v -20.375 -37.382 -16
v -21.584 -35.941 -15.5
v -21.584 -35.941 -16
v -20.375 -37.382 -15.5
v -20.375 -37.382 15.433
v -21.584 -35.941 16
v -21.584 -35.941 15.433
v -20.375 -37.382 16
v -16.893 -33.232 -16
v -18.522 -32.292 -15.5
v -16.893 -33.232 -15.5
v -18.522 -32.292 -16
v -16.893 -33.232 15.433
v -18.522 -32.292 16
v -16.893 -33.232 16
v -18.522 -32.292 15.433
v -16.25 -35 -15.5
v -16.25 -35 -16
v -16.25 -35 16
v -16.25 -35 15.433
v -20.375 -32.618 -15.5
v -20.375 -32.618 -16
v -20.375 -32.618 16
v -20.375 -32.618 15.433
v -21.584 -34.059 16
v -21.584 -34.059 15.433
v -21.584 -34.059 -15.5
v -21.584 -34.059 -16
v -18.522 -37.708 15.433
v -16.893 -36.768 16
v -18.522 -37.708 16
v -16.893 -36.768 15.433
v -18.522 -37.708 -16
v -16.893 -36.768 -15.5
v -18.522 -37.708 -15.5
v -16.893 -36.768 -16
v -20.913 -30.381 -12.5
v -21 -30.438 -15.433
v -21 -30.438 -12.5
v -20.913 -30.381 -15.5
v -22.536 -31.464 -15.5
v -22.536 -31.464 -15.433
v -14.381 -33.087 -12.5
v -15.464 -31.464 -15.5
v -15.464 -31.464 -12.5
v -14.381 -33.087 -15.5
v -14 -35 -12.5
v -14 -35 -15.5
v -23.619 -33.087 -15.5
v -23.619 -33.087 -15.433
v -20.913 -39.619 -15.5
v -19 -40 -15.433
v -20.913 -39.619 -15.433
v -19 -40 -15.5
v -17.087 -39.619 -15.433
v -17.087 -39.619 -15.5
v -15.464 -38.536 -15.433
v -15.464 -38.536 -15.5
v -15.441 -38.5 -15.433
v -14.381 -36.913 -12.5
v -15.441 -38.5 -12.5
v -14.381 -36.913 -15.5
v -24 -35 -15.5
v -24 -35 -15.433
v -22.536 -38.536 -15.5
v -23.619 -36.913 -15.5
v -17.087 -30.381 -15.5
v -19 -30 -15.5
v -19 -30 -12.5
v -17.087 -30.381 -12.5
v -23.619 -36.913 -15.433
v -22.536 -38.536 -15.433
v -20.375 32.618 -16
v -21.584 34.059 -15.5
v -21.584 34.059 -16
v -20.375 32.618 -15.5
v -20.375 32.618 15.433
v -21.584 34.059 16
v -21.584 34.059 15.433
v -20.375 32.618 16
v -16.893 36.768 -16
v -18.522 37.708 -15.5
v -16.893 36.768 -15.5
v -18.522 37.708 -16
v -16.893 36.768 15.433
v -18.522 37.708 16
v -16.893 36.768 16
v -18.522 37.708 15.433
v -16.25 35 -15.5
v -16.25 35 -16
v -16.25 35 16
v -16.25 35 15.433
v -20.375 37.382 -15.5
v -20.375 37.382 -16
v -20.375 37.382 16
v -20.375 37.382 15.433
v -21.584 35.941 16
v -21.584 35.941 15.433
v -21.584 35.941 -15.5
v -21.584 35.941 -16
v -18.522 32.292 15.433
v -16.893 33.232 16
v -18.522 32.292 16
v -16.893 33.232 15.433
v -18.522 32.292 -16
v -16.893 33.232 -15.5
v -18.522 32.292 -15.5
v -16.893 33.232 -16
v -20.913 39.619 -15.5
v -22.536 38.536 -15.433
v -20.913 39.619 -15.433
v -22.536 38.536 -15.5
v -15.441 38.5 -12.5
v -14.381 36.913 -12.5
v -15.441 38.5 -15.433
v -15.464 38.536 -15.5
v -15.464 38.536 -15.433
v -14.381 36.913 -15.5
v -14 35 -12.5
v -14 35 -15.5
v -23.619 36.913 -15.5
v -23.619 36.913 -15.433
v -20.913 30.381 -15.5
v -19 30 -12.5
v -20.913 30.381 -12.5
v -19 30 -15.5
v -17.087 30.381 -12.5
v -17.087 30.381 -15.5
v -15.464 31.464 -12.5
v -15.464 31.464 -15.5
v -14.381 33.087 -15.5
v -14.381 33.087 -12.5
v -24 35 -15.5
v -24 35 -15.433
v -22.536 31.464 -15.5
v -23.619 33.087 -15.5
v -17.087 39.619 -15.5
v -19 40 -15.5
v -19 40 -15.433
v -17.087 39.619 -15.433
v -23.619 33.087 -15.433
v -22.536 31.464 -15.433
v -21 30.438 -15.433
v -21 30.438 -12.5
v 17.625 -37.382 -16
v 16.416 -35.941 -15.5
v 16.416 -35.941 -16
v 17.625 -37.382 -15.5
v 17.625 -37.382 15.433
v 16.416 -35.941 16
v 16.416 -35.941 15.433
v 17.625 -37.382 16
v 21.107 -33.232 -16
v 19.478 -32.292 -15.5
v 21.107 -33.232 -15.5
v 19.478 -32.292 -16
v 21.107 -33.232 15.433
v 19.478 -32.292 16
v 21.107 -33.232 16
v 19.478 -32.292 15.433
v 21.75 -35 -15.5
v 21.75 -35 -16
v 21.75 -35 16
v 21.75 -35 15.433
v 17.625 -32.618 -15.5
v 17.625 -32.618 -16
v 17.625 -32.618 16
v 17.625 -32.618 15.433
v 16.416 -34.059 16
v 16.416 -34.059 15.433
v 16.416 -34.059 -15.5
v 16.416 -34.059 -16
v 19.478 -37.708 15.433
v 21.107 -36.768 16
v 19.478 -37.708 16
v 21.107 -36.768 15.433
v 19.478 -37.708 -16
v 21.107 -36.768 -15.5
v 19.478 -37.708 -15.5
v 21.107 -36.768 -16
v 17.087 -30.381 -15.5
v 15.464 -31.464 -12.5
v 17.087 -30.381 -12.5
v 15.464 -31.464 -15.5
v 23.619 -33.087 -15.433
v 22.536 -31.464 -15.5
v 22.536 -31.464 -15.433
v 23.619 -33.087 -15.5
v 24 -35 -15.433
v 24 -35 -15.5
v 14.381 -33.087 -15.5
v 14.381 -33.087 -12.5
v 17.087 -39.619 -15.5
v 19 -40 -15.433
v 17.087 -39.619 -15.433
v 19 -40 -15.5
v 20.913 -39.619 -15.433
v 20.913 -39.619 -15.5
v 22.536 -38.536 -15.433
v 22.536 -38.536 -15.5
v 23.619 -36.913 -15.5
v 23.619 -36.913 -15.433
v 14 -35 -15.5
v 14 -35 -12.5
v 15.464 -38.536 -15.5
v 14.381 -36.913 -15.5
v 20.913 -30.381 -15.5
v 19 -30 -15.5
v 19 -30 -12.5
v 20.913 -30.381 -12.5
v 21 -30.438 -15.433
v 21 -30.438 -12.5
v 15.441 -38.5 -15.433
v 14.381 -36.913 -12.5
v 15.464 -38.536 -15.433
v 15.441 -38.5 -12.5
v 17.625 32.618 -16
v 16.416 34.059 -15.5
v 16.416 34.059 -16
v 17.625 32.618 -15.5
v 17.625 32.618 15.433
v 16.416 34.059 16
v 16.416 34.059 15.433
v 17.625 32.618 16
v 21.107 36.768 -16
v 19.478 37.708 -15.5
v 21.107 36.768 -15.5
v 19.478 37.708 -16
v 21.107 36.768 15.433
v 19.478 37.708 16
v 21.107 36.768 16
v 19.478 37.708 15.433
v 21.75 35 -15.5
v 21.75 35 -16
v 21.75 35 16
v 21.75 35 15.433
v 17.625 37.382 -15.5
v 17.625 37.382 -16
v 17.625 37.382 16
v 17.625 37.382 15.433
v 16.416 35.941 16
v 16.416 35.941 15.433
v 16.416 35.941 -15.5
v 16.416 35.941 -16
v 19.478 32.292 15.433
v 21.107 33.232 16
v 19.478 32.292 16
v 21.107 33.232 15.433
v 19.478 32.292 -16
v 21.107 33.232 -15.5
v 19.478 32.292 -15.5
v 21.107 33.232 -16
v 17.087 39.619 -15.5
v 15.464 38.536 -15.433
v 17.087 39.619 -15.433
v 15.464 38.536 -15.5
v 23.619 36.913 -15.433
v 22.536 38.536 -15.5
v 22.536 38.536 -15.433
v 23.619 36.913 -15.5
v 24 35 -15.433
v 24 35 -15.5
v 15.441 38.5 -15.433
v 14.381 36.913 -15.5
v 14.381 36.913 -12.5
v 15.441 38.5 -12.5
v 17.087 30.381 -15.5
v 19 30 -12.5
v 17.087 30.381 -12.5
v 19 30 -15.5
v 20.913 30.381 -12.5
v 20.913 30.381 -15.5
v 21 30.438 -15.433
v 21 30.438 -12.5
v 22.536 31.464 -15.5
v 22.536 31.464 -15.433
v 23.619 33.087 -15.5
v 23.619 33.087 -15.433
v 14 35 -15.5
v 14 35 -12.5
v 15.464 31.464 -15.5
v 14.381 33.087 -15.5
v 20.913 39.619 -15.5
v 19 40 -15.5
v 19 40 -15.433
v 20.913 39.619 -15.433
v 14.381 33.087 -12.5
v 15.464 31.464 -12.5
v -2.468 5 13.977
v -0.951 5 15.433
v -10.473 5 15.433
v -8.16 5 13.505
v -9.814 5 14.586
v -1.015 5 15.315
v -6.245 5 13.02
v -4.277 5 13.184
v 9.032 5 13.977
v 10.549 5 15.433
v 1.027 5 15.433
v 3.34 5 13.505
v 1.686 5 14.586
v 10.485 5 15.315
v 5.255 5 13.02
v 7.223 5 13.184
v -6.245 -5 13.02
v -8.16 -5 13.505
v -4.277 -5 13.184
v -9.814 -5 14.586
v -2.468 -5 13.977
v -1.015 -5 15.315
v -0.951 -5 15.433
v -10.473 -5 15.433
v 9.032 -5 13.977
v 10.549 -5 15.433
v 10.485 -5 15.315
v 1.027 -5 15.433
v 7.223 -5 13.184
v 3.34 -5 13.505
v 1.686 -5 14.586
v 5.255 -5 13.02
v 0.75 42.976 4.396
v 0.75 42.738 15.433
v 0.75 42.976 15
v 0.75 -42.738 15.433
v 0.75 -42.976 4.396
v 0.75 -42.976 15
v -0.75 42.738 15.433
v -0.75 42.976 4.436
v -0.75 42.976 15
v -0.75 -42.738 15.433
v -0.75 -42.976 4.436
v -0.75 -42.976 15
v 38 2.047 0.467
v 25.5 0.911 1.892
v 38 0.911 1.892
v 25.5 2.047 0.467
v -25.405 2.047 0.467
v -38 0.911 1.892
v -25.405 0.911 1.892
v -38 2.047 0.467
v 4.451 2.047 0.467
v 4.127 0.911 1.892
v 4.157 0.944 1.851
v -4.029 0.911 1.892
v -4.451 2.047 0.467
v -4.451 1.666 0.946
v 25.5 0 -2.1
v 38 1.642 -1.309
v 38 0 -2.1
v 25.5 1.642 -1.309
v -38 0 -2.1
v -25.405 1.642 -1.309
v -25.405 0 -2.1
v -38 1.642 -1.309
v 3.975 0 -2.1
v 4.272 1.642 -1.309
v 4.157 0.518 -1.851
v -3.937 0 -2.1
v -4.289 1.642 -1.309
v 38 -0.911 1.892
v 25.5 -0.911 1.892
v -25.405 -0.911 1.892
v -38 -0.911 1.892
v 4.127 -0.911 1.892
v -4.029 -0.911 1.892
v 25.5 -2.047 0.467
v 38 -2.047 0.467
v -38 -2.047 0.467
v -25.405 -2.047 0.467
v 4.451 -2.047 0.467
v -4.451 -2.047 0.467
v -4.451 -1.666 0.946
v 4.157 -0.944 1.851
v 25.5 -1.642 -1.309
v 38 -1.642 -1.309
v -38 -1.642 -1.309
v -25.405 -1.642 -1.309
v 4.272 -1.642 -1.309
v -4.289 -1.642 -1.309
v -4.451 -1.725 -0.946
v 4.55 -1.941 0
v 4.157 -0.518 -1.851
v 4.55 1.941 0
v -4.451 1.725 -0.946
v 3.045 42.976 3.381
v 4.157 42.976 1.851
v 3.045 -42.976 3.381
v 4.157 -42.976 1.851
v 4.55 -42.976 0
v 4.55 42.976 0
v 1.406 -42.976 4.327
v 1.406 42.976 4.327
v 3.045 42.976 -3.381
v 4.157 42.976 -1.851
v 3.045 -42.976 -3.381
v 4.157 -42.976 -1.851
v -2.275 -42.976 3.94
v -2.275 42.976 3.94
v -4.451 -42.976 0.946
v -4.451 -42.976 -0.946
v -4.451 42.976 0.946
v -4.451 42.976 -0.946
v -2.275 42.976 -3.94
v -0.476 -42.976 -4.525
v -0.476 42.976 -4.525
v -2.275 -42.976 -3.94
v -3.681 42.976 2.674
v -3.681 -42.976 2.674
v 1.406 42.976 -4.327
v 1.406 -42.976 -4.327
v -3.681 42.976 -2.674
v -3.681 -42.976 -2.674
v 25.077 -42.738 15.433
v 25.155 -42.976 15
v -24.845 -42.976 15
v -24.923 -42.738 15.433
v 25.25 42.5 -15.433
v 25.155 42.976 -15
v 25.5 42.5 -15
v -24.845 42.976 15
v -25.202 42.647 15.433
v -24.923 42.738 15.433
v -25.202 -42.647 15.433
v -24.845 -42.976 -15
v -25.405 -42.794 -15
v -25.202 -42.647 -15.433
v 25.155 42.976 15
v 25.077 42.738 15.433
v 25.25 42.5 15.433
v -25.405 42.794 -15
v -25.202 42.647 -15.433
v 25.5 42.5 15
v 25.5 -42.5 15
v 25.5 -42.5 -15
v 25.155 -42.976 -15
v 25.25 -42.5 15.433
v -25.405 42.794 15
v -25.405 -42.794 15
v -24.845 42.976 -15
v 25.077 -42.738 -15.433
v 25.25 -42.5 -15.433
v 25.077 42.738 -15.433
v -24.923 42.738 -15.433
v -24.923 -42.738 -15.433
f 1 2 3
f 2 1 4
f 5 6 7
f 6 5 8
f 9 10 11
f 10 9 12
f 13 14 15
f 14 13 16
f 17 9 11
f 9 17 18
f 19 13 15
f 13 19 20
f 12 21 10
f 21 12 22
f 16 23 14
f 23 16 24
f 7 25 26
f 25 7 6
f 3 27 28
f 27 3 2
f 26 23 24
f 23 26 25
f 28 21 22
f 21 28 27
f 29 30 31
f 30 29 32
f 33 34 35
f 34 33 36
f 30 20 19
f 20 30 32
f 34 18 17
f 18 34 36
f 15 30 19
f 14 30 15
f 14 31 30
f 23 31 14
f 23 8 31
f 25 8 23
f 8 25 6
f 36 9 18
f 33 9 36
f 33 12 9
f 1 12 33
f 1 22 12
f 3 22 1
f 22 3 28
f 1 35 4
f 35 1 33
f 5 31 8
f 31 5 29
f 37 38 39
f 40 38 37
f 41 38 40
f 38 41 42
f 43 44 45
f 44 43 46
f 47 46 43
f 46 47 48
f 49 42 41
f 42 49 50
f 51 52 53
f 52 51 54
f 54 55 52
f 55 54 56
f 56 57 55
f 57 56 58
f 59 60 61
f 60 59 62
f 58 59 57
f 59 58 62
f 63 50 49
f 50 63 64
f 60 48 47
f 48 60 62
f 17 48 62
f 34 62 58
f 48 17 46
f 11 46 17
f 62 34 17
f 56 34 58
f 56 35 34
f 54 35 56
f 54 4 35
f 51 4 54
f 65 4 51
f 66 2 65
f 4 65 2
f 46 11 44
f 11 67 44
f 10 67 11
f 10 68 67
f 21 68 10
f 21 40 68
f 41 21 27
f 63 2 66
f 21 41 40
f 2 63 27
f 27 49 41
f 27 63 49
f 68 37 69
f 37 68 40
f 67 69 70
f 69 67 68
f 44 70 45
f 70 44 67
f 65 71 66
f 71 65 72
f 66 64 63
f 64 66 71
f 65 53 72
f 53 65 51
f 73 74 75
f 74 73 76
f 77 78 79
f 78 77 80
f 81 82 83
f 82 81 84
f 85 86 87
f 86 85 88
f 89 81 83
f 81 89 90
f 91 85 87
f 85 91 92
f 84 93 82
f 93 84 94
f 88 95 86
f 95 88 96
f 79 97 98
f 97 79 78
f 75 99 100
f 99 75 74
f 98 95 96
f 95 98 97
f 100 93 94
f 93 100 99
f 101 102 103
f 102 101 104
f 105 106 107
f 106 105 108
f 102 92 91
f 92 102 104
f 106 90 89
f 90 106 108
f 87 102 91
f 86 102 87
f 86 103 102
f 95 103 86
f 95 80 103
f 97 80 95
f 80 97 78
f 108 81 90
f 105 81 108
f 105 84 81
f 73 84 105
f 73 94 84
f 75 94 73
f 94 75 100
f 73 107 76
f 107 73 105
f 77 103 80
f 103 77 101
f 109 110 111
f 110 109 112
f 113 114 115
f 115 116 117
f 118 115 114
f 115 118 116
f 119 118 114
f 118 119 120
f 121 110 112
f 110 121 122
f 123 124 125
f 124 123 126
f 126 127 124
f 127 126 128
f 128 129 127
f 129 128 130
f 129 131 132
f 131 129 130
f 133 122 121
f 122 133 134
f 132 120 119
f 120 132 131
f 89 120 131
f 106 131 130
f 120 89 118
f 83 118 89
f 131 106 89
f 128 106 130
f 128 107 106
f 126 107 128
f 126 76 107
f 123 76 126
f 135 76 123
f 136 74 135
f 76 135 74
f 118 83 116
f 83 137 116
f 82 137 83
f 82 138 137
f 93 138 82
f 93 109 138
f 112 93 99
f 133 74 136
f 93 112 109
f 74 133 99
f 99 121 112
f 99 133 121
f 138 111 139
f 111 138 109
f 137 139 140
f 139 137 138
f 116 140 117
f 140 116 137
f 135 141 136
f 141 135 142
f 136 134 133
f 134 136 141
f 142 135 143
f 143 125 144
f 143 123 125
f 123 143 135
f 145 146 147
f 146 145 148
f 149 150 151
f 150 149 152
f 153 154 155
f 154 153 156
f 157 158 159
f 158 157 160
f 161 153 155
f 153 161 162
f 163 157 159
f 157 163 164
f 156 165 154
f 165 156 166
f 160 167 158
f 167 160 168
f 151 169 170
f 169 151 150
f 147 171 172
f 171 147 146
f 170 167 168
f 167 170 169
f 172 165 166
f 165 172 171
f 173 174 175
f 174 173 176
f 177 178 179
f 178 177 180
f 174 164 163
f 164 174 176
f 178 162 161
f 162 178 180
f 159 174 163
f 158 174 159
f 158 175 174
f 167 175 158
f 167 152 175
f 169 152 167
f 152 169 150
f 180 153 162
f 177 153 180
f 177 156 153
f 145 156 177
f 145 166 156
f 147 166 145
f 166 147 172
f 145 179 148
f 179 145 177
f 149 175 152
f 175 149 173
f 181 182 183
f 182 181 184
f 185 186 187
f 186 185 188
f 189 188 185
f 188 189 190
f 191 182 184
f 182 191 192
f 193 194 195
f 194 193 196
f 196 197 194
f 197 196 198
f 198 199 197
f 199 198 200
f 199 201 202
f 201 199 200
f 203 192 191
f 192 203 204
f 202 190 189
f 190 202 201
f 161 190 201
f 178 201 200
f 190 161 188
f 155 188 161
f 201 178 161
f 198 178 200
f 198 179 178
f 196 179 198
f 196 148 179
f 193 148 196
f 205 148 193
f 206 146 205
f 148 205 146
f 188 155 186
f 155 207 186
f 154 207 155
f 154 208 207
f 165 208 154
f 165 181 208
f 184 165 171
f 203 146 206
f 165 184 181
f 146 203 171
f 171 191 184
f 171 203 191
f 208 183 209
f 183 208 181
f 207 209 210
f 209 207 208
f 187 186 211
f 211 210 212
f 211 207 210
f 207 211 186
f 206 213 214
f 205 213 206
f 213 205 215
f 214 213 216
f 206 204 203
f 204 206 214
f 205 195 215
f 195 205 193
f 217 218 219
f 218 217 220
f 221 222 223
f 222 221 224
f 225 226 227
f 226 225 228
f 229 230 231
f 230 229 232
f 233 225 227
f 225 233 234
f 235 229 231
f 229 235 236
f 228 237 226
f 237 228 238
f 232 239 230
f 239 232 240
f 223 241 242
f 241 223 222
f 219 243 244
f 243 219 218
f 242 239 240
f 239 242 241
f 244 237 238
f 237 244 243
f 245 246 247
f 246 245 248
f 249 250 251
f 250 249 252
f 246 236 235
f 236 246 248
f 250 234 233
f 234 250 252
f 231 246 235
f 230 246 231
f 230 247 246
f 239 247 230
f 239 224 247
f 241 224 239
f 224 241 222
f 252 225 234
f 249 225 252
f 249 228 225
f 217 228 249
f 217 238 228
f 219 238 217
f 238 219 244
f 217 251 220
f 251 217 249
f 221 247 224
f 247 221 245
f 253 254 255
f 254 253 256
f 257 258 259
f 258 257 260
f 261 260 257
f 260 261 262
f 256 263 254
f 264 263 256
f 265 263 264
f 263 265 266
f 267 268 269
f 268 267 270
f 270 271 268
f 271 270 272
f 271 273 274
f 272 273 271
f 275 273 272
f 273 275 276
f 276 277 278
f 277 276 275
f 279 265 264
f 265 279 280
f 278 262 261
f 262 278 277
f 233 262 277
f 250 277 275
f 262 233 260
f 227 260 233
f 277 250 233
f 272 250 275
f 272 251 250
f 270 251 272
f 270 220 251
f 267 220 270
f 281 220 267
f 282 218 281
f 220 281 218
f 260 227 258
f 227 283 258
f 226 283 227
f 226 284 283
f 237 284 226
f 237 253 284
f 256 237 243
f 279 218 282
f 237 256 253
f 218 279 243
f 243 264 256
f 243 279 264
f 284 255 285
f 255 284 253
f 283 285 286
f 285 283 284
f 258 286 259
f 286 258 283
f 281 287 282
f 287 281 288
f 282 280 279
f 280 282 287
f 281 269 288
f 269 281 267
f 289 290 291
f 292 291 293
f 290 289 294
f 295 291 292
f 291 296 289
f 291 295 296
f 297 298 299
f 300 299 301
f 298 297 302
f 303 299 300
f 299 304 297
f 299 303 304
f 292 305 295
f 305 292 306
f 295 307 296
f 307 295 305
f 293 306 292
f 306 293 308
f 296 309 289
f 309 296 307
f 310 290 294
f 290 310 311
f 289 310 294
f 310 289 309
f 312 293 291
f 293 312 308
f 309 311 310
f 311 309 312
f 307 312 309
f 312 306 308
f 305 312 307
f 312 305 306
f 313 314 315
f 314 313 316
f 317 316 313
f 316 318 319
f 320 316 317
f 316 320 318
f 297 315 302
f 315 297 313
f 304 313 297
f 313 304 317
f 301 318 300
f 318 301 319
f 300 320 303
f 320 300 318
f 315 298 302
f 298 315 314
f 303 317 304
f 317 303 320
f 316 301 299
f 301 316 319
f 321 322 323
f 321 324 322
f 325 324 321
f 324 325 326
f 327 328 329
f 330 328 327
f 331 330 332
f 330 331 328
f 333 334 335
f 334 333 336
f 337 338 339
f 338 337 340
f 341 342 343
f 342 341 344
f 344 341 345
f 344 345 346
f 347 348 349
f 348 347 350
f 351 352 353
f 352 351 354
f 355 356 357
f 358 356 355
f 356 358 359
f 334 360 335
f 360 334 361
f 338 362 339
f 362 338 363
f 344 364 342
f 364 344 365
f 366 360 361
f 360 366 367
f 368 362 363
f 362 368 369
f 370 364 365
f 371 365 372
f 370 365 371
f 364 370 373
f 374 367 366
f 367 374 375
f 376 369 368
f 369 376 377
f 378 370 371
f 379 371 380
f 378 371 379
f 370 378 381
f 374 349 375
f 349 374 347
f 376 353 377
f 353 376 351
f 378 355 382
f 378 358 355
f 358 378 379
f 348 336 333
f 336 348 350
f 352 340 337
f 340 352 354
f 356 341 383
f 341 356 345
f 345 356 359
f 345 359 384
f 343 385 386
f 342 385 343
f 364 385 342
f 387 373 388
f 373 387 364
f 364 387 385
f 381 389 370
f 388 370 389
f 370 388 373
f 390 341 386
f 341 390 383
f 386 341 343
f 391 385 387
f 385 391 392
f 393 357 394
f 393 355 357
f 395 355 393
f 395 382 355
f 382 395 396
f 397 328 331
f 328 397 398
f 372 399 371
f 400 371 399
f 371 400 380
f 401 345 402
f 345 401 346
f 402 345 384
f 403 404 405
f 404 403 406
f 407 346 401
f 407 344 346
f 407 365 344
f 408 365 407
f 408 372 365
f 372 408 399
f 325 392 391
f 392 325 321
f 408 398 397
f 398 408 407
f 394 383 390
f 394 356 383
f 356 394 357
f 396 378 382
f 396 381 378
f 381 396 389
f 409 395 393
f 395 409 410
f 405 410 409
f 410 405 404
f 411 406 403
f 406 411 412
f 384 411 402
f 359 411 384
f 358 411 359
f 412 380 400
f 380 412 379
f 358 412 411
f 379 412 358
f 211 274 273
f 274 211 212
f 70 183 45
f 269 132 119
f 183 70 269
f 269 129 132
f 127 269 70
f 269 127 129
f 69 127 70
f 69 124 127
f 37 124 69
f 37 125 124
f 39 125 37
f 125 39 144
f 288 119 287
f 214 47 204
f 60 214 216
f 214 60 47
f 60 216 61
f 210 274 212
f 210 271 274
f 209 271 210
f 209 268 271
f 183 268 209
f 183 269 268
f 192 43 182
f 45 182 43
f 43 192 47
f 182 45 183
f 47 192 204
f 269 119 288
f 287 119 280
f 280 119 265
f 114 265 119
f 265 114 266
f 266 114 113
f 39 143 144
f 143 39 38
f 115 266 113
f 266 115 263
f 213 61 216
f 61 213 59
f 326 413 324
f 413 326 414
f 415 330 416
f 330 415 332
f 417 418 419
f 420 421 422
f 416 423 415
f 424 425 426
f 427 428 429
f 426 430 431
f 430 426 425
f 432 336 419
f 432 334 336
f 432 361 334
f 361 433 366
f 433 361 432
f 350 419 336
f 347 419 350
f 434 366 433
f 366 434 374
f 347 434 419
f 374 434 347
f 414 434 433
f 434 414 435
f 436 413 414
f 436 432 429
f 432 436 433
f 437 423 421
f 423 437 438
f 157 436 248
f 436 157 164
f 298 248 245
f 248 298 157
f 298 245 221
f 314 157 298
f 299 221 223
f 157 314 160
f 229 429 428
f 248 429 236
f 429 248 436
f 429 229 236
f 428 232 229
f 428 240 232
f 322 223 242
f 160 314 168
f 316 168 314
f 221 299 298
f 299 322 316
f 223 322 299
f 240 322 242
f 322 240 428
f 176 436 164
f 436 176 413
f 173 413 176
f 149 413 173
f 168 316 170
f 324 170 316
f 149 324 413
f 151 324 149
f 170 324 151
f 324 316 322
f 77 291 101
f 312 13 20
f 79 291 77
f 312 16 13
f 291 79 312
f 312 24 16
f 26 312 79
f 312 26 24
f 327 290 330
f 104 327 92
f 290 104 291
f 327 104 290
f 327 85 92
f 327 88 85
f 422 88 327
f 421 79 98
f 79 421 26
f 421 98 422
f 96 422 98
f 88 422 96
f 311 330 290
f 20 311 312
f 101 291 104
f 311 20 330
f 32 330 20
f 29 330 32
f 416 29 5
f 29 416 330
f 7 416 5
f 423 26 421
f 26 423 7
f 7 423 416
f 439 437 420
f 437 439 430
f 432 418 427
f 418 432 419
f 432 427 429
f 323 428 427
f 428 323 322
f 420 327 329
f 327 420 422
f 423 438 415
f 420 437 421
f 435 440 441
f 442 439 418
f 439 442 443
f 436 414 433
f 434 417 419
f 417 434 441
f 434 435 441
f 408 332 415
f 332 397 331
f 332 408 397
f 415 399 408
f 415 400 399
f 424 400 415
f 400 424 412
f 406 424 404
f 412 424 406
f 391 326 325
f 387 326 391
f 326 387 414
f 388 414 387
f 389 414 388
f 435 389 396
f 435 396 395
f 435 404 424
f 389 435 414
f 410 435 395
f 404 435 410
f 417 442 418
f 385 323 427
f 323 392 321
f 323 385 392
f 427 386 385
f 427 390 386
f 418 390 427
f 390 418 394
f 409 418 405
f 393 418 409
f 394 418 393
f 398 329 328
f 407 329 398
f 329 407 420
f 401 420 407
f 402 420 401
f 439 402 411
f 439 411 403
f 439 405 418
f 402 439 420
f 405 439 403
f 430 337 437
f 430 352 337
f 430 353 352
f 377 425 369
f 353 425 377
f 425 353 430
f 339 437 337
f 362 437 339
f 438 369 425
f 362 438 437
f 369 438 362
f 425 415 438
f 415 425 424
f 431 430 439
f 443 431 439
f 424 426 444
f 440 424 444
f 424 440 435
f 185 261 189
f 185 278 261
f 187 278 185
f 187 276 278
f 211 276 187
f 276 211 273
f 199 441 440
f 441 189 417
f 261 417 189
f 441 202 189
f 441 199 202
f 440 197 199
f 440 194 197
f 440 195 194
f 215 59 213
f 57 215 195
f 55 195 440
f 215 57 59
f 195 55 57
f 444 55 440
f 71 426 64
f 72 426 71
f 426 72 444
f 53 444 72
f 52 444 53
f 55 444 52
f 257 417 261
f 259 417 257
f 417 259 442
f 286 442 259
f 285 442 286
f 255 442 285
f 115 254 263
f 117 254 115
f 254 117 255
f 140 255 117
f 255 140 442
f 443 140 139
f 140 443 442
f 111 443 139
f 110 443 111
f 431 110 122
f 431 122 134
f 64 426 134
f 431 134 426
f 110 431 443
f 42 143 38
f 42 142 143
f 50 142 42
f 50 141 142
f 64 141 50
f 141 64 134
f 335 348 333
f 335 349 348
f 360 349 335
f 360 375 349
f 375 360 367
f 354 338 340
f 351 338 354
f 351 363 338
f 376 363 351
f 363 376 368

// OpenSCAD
// Parameters
shaft_diameter = 9.0; //[4.5:18.0:0.1]
bore_clearance = 0.1; //[0.0:0.5:0.05]
block_width = 50.0; //[25.0:100.0:0.5]
block_length = 85.0; //[42.5:170.0:0.5]
block_height = 30.0; //[15.0:60.0:0.5]
bearing_outer_diameter = 16.0; //[10.0:32.0:0.1]
bearing_length = 30.0; //[15.0:60.0:0.5]
mount_hole_count = 4; //[2:6:1]
mount_hole_diameter = 5.5; //[3.0:10.0:0.1]
mount_counterbore_diameter = 10.0; //[6.0:18.0:0.1]
mount_counterbore_depth = 4.0; //[1.0:10.0:0.1]
mount_hole_edge_margin = 6.0; //[3.0:15.0:0.5]
mount_hole_spacing_x = 38.0; //[20.0:80.0:0.5]
mount_hole_spacing_y = 70.0; //[30.0:140.0:0.5]
clamp_enabled = 1; //[0:1:1]
clamp_slot_width = 1.5; //[0.8:3.0:0.1]
clamp_slot_depth = 18.0; //[8.0:40.0:0.5]
clamp_screw_diameter = 4.2; //[2.5:8.0:0.1]
clamp_boss_diameter = 12.0; //[8.0:24.0:0.5]
clamp_boss_height = 10.0; //[6.0:20.0:0.5]
bottom_relief_depth = 2.0; //[0.5:6.0:0.1]
bottom_relief_margin = 4.0; //[2.0:10.0:0.5]
chamfer_size = 0.5; //[0.0:2.0:0.1]
overlap = 1.0; //[0.5:2.0:0.1]

// Bearing Block Body with Chamfers
module bearing_block_body_chamfered() {
  minkowski() {
    cube([block_width, block_length, block_height], center=true);
    sphere(r=chamfer_size, center=true);
  }
}

// Mounting Holes with Counterbores
module mount_holes_with_counterbores() {
  union() {
    for (x = [-1, 1])
      for (y = [-1, 1]) {
        translate([x * mount_hole_spacing_x / 2, y * mount_hole_spacing_y / 2, 0]) {
          cylinder(r=mount_hole_diameter / 2, h=block_height + 2 * overlap, center=true);
          translate([0, 0, -block_height / 2 + mount_counterbore_depth / 2])
            cylinder(r=mount_counterbore_diameter / 2, h=mount_counterbore_depth + overlap, center=true);
        }
      }
  }
}

// Shaft Bore
module shaft_bore_or_bearing_bore() {
  rotate([90, 0, 0])
    cylinder(r=(shaft_diameter + bore_clearance) / 2, h=block_length + 2 * overlap, center=true);
}

// Split Clamp Slot and Clamping Screw Bosses
module split_clamp_slot_and_clamping_screw_bosses() {
  union() {
    translate([0, 0, block_height / 2 - clamp_slot_depth / 2])
      cube([clamp_slot_width, block_length + 2 * overlap, clamp_slot_depth + overlap], center=true);
    for (x = [-1, 1]) {
      translate([x * (clamp_slot_width / 2 + clamp_boss_diameter / 2 - overlap), 0, block_height / 2 + clamp_boss_height / 2 - overlap])
        rotate([90, 0, 0])
          cylinder(r=clamp_boss_diameter / 2, h=clamp_boss_height, center=true);
    }
  }
}

// Clamp Screw Hole
module clamp_screw_hole() {
  rotate([0, 90, 0])
    cylinder(r=clamp_screw_diameter / 2, h=block_width + 2 * clamp_boss_diameter + 2 * overlap, center=true);
}

// Bottom Relief Pocket
module bottom_relief_pocket() {
  translate([0, 0, -block_height / 2 + bottom_relief_depth / 2])
    cube([block_width - 2 * bottom_relief_margin, block_length - 2 * bottom_relief_margin, bottom_relief_depth + overlap], center=true);
}

// SBR Bearing Block
module sbr_bearing_block() {
  difference() {
    bearing_block_body_chamfered();
    union() {
      shaft_bore_or_bearing_bore();
      mount_holes_with_counterbores();
      if (clamp_enabled) {
        split_clamp_slot_and_clamping_screw_bosses();
        clamp_screw_hole();
      }
      bottom_relief_pocket();
    }
  }
}

// SCS Bearing Block Hole Positions
module scs_bearing_block_hole_positions() {
  mount_holes_with_counterbores();
  if (clamp_enabled) {
    clamp_screw_hole();
  }
}

// SCS Bearing Block
module scs_bearing_block() {
  union() {
    sbr_bearing_block();
    scs_bearing_block_hole_positions();
  }
}

// SBR Bearing Block Assembly
module sbr_bearing_block_assembly() {
  union() {
    sbr_bearing_block();
    scs_bearing_block_hole_positions();
  }
}

// Final Assembly
module assembly() {
  sbr_bearing_block_assembly();
}

assembly();
